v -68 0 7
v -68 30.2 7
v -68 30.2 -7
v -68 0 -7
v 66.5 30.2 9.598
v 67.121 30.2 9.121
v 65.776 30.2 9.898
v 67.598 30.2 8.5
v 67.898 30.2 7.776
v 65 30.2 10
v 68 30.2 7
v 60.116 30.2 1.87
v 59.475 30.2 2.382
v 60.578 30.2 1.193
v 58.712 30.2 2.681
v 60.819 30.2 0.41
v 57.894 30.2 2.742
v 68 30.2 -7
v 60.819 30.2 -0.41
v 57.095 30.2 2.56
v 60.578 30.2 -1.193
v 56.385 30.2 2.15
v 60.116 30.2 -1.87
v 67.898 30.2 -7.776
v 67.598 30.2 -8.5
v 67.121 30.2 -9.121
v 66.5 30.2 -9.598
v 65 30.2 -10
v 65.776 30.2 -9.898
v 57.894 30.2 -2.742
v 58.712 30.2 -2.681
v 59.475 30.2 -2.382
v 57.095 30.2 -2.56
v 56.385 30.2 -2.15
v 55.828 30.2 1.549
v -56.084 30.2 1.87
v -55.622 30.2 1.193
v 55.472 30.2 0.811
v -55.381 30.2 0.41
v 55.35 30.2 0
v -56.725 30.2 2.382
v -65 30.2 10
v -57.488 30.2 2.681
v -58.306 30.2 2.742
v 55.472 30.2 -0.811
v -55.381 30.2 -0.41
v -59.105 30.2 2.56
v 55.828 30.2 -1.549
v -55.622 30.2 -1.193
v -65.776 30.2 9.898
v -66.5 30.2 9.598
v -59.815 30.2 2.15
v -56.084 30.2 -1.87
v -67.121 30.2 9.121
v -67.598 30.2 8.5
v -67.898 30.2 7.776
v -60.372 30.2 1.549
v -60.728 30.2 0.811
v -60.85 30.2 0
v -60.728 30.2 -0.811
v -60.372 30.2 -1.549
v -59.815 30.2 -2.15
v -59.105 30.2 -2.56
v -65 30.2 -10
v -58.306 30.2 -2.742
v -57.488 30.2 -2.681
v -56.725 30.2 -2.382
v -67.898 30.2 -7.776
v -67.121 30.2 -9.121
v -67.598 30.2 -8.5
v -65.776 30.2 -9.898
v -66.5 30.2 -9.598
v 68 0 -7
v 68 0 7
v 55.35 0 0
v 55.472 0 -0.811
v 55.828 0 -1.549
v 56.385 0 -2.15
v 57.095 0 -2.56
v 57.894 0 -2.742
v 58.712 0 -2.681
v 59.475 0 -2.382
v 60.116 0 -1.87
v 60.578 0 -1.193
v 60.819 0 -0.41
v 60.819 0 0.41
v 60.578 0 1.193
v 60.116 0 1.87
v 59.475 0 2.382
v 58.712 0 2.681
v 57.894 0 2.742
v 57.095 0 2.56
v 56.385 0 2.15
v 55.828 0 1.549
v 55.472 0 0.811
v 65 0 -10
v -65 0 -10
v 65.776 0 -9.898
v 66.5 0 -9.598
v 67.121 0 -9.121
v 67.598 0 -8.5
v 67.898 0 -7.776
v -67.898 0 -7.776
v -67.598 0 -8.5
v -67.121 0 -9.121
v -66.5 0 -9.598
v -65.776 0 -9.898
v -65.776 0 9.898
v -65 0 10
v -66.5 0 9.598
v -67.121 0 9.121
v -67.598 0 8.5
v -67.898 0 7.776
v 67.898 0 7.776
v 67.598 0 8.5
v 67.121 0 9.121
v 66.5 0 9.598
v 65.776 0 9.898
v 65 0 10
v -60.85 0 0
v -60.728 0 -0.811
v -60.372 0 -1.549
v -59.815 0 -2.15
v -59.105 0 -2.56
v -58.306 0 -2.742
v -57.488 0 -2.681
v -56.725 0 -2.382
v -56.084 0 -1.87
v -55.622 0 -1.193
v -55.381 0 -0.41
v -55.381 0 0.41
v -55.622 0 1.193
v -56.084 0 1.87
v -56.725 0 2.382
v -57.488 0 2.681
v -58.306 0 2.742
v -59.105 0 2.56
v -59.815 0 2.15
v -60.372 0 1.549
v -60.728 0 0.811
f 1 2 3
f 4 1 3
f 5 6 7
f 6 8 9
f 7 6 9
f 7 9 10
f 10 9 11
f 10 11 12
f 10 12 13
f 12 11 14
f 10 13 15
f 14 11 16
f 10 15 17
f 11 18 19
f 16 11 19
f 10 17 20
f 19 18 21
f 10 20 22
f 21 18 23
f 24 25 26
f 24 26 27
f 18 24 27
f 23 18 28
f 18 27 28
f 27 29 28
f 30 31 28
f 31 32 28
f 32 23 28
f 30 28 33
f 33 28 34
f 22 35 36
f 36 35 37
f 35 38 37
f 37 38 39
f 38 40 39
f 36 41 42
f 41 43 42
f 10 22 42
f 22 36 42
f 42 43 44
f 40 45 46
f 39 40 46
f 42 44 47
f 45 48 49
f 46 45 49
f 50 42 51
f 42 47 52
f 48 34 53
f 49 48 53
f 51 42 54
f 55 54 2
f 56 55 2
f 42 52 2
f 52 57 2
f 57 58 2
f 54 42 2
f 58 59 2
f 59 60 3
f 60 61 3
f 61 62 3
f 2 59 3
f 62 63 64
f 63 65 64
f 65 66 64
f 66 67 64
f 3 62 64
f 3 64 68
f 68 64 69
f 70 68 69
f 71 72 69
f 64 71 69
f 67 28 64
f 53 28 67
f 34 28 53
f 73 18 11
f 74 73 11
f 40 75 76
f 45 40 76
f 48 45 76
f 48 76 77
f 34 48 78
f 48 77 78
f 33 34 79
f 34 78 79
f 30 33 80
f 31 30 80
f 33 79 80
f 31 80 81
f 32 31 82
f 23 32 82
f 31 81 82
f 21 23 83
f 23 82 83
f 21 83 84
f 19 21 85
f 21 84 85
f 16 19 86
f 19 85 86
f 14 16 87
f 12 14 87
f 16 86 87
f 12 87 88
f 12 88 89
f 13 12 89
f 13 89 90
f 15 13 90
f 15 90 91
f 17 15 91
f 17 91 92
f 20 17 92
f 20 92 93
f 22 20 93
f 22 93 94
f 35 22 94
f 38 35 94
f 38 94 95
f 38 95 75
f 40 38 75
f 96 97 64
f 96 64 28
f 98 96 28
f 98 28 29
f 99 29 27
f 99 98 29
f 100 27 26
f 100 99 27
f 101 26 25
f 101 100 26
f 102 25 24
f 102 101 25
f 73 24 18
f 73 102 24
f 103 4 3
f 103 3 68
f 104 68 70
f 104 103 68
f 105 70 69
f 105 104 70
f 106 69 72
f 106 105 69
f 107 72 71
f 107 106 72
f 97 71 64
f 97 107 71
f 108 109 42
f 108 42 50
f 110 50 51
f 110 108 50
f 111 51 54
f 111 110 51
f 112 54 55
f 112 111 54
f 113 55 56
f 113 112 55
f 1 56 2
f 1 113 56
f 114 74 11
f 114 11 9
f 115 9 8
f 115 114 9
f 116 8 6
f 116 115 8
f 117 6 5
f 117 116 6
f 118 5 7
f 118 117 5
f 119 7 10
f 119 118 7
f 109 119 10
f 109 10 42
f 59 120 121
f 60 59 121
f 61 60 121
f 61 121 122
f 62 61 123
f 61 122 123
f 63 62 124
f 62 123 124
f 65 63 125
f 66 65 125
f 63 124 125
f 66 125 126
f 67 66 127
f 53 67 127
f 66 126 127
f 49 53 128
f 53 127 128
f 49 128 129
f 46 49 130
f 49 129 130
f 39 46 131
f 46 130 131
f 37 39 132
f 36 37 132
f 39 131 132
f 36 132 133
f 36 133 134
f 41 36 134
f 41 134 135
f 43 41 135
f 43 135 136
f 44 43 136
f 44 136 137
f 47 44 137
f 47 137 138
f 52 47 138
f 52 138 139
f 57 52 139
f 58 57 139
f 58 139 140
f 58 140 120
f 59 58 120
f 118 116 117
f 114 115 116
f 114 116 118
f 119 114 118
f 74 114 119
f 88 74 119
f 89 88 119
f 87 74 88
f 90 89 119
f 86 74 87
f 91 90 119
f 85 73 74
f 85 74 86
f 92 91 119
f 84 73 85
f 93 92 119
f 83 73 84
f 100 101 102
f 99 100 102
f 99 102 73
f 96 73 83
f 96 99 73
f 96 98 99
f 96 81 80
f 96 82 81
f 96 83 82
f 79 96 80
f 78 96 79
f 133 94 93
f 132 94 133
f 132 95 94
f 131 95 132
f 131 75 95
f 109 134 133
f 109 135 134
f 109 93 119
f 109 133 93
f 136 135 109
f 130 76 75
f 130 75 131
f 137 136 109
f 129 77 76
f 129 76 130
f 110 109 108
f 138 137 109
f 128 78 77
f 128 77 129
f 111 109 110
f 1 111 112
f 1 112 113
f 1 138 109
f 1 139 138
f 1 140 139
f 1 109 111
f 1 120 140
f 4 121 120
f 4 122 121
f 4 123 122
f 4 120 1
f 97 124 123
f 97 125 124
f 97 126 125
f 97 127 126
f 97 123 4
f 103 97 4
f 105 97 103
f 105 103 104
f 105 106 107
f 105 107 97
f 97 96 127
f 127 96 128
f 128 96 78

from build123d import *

# Parameters (mm, degrees)
BOSS_EXTRUDE1_DEPTH      = 30.2
M5_CLEARANCE_HOLE1_D     = 5.5
M5_CLEARANCE_HOLE1_DEPTH = 30.2


with BuildPart() as part:
    # Sketch1 → Boss-Extrude1 (new body)
    with BuildSketch(Plane(origin=(0, 0, 0), x_dir=(1, 0, 0), z_dir=(0, 1, 0))):
        with BuildLine():
            Line((65, -10), (-65, -10))
            ThreePointArc((-65, -10), (-67.121320344, -9.121320344), (-68, -7))
            Line((-68, -7), (-68, 7))
            ThreePointArc((-68, 7), (-67.121320344, 9.121320344), (-65, 10))
            Line((-65, 10), (65, 10))
            ThreePointArc((65, 10), (67.121320344, 9.121320344), (68, 7))
            Line((68, 7), (68, -7))
            ThreePointArc((68, -7), (67.121320344, -9.121320344), (65, -10))
        make_face()
    extrude(amount=BOSS_EXTRUDE1_DEPTH)

    # M5 Clearance Hole1
    with Locations(Plane(origin=(0, 30.2, 0), x_dir=(1, 0, 0), z_dir=(0, 1, 0))):
        with Locations((-58.1, 0), (58.1, 0)):
            Hole(M5_CLEARANCE_HOLE1_D / 2, depth=M5_CLEARANCE_HOLE1_DEPTH)


solid = part.part
